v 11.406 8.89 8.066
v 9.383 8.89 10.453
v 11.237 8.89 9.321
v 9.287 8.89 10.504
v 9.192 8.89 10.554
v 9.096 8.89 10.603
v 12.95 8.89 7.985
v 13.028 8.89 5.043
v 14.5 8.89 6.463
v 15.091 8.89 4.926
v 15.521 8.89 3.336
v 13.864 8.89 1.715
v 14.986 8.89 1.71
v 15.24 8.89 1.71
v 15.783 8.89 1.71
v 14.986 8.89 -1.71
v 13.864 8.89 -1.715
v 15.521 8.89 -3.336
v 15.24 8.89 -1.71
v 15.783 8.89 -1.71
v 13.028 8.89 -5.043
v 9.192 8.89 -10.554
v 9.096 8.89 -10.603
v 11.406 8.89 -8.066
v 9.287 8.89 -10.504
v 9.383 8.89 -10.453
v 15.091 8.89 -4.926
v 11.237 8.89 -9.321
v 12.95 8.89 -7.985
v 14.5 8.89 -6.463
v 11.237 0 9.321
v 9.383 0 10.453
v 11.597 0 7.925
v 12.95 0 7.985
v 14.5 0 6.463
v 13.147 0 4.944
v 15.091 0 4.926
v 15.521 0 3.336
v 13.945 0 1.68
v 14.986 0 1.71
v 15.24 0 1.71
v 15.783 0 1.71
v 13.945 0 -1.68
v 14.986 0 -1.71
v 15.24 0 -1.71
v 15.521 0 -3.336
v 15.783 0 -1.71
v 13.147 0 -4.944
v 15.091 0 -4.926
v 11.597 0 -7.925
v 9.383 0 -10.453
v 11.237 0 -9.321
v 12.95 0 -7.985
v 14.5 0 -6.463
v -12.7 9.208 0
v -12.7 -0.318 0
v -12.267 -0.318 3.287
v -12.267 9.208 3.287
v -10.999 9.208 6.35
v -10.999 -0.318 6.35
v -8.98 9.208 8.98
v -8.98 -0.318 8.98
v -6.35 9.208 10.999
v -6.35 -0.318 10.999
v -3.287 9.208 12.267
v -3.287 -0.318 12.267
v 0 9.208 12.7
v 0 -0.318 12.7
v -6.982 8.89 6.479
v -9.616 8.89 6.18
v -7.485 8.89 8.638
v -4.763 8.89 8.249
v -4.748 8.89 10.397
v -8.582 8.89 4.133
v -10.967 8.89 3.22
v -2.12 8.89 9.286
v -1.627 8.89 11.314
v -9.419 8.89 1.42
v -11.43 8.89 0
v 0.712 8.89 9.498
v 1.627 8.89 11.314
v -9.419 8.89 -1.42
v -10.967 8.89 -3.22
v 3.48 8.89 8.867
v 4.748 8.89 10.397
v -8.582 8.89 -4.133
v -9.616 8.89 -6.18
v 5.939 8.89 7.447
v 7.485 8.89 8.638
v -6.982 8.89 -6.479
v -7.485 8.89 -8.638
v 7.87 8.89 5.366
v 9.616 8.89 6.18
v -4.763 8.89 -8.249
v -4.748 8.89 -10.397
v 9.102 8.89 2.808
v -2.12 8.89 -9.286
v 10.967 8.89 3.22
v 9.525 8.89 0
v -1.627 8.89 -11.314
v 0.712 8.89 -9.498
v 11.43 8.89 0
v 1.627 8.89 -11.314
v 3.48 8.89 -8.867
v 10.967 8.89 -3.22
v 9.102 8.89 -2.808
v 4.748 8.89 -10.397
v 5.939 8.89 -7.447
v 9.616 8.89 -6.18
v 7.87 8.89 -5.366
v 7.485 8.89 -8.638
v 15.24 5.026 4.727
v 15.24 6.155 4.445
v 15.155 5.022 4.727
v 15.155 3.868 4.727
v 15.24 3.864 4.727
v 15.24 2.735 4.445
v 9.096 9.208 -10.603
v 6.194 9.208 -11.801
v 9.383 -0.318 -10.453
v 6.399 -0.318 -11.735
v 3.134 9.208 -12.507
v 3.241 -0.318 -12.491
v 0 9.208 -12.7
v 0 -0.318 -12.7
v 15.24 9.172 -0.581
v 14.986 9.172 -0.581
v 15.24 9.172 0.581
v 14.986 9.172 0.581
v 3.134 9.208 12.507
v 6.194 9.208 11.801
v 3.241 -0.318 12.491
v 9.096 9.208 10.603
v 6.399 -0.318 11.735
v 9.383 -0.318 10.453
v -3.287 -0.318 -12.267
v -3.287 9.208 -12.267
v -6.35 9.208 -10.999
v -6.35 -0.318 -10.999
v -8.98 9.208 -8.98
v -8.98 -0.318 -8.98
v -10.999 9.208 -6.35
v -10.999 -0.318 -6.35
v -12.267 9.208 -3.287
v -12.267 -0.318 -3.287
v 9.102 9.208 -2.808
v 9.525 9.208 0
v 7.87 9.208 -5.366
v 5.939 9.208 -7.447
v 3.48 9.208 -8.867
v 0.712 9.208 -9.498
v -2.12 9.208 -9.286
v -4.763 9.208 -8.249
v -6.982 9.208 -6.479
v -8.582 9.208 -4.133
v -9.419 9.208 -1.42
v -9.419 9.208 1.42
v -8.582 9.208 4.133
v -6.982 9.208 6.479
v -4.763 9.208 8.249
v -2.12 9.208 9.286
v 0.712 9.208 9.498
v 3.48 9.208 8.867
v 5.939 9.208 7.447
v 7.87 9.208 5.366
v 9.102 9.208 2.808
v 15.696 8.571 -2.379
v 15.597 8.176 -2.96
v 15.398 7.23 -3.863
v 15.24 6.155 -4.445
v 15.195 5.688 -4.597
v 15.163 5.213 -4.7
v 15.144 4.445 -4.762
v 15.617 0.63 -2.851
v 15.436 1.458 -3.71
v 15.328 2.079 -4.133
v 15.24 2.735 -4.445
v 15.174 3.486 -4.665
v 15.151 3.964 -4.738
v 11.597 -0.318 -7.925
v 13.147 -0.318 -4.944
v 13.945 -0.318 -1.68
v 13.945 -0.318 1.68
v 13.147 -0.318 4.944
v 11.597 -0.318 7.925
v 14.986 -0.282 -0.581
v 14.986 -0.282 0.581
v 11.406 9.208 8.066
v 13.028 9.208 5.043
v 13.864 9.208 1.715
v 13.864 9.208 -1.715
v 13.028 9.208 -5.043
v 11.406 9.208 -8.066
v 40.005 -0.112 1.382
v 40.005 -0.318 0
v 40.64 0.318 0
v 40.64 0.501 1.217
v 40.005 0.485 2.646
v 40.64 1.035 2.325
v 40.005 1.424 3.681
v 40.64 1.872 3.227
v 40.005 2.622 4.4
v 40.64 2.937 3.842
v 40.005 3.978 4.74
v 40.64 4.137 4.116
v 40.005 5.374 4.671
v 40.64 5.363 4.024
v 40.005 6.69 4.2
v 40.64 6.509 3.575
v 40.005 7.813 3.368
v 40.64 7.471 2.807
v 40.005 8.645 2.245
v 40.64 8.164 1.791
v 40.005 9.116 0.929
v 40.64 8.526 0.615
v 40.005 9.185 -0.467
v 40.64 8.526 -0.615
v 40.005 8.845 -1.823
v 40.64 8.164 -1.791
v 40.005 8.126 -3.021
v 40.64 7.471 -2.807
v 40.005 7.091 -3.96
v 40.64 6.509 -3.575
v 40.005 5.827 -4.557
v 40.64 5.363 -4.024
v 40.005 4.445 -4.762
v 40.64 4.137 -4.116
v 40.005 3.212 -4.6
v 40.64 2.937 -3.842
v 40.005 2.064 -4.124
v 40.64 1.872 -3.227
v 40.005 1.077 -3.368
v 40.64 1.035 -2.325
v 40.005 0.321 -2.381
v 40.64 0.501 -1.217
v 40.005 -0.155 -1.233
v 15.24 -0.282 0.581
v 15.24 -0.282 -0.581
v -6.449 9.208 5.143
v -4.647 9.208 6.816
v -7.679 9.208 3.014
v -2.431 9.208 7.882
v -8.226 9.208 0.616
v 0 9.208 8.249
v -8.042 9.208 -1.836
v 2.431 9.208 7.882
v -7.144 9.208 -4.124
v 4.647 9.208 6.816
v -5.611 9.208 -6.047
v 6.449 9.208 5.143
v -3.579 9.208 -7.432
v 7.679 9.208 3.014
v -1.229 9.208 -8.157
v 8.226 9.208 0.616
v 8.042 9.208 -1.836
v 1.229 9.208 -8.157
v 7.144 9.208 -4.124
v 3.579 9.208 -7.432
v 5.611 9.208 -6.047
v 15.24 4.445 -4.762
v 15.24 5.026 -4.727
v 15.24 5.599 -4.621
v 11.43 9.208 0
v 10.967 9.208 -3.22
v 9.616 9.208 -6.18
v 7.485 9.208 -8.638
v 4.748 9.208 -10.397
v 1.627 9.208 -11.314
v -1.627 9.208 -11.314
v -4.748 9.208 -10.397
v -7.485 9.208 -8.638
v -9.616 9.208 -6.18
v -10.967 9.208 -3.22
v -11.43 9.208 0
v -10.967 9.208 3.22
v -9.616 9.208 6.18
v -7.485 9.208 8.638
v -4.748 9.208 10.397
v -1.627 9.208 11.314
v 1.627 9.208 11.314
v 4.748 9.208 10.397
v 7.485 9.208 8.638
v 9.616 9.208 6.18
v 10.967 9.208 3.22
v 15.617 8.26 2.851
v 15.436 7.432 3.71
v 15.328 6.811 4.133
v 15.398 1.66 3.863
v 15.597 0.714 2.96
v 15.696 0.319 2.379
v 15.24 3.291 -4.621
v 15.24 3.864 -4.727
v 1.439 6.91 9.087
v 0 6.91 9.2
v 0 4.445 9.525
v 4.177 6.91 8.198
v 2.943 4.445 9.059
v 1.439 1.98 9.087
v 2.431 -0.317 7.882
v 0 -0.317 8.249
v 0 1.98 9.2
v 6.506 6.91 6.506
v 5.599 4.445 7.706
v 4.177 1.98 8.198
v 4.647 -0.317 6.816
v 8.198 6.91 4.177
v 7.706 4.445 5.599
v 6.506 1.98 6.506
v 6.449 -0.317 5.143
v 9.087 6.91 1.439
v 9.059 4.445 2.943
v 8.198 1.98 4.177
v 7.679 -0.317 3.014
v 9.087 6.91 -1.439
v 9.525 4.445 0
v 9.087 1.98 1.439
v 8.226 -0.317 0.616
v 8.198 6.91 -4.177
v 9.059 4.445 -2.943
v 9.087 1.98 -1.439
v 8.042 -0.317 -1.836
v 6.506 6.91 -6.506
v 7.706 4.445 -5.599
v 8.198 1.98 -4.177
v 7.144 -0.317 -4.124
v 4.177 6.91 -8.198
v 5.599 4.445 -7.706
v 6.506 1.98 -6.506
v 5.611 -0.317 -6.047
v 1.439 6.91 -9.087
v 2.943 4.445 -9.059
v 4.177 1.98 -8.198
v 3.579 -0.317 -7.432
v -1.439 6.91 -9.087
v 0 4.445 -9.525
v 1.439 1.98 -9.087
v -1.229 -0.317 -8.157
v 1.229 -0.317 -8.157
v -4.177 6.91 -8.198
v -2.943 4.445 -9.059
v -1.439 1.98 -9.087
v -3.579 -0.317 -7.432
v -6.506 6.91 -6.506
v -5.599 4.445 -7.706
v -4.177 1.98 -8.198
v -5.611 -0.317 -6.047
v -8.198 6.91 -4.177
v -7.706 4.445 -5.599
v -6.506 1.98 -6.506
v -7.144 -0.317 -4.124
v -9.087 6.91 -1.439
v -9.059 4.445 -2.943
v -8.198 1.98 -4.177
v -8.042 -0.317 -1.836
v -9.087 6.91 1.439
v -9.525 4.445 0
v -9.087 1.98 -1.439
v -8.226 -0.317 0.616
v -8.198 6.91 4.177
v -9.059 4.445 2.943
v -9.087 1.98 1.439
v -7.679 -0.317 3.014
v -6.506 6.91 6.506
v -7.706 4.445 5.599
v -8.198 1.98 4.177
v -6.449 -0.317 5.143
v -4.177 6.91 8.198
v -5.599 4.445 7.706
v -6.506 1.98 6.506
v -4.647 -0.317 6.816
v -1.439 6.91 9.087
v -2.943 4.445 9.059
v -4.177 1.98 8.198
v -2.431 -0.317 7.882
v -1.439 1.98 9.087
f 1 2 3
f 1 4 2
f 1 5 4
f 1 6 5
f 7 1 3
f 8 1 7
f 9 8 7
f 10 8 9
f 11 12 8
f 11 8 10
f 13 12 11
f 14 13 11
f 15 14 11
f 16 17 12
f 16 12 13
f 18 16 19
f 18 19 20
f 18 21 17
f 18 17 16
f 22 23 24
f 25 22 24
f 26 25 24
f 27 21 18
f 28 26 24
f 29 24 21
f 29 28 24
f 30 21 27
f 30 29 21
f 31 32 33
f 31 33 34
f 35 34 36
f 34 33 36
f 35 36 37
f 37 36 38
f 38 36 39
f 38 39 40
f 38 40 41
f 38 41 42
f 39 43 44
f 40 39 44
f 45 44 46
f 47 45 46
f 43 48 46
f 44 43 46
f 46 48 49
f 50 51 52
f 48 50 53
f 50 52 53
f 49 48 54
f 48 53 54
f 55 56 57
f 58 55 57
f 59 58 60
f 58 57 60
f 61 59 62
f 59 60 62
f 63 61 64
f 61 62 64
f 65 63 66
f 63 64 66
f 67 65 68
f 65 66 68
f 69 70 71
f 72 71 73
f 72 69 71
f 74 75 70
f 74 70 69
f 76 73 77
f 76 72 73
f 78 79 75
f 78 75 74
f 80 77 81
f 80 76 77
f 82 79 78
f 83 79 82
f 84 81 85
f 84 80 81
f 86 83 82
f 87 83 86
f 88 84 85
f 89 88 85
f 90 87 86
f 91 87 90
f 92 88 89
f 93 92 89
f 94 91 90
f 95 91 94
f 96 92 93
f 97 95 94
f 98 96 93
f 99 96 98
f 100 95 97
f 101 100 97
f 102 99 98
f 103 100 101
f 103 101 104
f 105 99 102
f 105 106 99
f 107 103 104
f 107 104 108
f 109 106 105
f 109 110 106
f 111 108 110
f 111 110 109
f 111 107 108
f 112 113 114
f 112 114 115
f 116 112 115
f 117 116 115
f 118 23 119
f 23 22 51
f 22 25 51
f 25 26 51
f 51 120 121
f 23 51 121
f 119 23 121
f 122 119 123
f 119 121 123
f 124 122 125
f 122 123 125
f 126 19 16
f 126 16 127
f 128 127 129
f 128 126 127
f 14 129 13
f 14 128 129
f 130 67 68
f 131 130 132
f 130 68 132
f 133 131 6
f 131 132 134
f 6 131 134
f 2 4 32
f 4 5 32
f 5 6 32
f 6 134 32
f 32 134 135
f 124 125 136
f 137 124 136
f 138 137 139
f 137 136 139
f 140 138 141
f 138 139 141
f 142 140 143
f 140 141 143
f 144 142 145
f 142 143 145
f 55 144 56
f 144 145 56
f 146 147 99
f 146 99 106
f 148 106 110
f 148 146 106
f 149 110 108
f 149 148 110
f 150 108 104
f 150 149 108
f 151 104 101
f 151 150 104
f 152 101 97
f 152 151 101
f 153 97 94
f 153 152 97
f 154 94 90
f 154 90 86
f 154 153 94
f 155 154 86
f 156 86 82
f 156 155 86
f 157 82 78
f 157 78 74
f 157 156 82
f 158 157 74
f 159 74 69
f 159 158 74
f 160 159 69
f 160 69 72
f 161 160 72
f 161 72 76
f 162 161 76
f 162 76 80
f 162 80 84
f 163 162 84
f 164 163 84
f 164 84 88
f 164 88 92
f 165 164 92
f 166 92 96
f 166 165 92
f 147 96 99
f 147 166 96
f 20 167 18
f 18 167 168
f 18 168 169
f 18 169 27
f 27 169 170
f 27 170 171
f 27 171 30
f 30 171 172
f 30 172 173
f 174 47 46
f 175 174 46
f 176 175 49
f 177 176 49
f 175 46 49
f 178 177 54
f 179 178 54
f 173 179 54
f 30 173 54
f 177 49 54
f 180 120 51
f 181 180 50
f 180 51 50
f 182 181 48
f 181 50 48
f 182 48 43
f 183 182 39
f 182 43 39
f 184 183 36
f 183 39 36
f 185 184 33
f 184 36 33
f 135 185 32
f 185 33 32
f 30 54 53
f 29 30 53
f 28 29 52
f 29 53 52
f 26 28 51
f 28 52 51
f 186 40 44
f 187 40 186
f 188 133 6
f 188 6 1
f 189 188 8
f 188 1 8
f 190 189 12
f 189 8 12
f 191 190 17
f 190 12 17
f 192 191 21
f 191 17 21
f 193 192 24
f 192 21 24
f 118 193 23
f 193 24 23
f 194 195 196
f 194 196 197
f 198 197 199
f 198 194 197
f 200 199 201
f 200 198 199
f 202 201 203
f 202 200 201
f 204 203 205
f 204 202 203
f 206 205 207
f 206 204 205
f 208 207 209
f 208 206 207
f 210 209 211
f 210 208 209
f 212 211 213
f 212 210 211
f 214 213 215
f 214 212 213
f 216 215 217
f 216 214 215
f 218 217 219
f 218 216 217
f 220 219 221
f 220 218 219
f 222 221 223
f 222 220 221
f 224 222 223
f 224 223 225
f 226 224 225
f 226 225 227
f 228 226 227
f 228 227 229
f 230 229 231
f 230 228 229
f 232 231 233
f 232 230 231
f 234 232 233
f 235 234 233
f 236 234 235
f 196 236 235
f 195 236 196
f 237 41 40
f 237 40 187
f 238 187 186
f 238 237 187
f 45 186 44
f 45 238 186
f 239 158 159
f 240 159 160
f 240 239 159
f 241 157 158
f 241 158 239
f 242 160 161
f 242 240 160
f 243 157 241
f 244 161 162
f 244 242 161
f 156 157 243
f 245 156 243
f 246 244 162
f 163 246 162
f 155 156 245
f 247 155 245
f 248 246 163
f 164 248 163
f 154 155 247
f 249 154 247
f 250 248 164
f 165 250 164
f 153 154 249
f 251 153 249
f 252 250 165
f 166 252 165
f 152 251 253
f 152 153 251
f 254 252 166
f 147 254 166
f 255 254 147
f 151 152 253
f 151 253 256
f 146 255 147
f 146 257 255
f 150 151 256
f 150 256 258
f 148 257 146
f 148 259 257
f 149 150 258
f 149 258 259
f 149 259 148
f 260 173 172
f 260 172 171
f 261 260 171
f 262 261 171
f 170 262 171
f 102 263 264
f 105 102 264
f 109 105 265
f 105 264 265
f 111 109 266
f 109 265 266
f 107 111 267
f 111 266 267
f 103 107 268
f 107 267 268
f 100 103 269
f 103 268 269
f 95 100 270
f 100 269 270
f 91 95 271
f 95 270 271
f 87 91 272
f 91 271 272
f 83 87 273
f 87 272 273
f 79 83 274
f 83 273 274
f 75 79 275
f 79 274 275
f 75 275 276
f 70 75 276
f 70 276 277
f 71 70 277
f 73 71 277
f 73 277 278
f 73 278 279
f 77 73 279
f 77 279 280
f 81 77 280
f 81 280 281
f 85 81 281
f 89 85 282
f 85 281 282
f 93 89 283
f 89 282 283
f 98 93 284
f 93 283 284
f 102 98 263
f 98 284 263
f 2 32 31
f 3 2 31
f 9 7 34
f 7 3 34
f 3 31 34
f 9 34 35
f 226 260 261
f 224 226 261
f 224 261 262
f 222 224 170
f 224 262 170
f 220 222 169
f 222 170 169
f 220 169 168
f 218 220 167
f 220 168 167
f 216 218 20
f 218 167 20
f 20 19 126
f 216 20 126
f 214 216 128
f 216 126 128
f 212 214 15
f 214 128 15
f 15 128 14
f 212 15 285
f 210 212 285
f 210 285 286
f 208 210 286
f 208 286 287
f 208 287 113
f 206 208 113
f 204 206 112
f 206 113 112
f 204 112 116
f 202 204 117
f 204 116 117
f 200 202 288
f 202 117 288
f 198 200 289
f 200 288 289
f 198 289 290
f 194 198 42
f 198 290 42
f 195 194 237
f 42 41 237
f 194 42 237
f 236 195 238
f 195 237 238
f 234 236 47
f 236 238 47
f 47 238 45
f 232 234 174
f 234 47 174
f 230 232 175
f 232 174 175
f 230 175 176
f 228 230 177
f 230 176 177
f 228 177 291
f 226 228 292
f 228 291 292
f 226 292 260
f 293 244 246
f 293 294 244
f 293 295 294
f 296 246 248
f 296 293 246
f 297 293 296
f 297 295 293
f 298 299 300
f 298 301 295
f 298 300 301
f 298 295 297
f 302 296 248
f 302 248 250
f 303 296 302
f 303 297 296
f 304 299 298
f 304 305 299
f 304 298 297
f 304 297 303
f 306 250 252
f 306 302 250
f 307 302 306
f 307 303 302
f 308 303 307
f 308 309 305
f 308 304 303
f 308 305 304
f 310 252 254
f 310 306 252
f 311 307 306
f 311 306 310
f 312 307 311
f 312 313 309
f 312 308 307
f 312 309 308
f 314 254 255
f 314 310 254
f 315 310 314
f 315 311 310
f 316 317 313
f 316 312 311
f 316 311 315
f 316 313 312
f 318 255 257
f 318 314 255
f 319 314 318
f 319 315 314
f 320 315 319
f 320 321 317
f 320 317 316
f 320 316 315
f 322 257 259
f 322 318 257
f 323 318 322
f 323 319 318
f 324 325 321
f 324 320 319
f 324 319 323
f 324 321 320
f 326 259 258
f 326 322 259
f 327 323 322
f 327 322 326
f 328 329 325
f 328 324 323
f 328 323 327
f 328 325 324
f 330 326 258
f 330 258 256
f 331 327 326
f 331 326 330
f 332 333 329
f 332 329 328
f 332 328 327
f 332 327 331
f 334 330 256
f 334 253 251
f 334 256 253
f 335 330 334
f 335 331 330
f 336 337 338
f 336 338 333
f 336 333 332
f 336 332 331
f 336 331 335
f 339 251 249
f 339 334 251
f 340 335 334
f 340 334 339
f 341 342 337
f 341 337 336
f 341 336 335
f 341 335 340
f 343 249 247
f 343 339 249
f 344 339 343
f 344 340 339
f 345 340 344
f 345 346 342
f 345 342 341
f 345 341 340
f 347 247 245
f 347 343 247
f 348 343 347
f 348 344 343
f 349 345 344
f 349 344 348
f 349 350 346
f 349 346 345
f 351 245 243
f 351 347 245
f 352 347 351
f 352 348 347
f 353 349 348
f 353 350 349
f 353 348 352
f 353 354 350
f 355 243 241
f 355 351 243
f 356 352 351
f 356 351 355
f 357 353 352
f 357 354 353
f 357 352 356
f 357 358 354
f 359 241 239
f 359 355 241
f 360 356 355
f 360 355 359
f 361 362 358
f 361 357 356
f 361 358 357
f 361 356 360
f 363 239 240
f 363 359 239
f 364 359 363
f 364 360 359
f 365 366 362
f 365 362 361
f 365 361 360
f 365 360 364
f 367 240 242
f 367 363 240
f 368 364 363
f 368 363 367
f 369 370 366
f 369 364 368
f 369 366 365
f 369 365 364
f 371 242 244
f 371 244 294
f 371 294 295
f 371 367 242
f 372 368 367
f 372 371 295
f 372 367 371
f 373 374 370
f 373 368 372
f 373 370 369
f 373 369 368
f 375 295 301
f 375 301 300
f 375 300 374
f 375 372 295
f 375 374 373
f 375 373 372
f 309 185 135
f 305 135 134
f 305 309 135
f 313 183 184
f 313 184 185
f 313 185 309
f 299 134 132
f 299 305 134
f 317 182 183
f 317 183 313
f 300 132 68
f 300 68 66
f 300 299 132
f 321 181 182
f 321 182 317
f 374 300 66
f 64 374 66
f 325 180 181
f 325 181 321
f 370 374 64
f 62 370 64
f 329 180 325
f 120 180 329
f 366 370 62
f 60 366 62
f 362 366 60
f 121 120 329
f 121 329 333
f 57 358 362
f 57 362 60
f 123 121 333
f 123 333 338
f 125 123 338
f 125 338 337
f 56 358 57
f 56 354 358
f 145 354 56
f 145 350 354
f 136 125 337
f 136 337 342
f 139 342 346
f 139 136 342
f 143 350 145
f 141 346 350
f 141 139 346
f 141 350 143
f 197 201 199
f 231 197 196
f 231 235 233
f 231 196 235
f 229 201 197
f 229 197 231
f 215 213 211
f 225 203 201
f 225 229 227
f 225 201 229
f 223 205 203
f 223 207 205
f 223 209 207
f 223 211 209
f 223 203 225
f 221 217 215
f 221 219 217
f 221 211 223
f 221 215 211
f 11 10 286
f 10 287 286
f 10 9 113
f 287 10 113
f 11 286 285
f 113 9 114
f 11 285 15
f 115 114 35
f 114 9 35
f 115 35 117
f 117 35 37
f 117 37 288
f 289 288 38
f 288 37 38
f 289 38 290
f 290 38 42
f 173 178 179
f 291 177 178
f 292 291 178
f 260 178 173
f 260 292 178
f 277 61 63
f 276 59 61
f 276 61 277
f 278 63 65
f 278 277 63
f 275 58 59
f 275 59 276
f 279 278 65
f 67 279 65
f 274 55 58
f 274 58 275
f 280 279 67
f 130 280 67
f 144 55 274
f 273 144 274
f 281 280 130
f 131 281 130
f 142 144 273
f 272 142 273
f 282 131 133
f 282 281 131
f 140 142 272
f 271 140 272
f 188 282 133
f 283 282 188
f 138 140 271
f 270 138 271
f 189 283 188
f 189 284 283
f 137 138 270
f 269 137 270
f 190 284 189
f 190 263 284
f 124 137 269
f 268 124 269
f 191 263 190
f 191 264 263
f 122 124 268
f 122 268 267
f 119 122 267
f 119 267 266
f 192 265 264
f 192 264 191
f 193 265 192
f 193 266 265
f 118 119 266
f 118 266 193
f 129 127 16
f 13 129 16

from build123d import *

# Parameters (mm, degrees)
SKETCH2_R                = 15.875
BOSS_EXTRUDE1_DEPTH      = 8.89
SKETCH3_R                = 13.97
BOSS_EXTRUDE2_DEPTH      = 0.3175
SKETCH4_R                = 14.0462
BOSS_EXTRUDE3_DEPTH      = 0.3175
CUT_EXTRUDE2_DEPTH       = 10.525
SKETCH7_R                = 11.43
SKETCH7_R_2              = 9.525
CUT_EXTRUDE3_DEPTH       = 0.3175
SKETCH9_R                = 4.7625
BOSS_EXTRUDE4_DEPTH      = 25.4
BOSS_EXTRUDE4_DEPTH_BACK = 0.254


with BuildPart() as part:
    # Sketch2 → Boss-Extrude1 (new body)
    with BuildSketch(Plane(origin=(0, 0, 0), x_dir=(1, 0, 0), z_dir=(0, 1, 0))):
        Circle(SKETCH2_R)
    extrude(amount=BOSS_EXTRUDE1_DEPTH)

    # Sketch3 → Boss-Extrude2 (add)
    with BuildSketch(Plane(origin=(0, 8.89, 0), x_dir=(1, 0, 0), z_dir=(0, 1, 0))):
        Circle(SKETCH3_R)
    extrude(amount=BOSS_EXTRUDE2_DEPTH)

    # Sketch4 → Boss-Extrude3 (add)
    with BuildSketch(Plane(origin=(0, 0, 0), x_dir=(-1, 0, 0), z_dir=(0, -1, 0))):
        Circle(SKETCH4_R)
    extrude(amount=BOSS_EXTRUDE3_DEPTH)

    # Sketch5 → Cut-Extrude2 (cut, through all)
    with BuildSketch(Plane(origin=(0, -0.3175, 0), x_dir=(-1, 0, 0), z_dir=(0, -1, 0))):
        with BuildLine():
            ThreePointArc((15.875, 0), (3.303921778, 15.527386319), (-14.499768616, 6.463152102))
            ThreePointArc((-14.499768616, 6.463152102), (-12.112281343, 8.677516697), (-9.382547241, 10.452920248))
            ThreePointArc((-9.382547241, 10.452920248), (5.723049859, 12.827409511), (14.0462, 0))
            ThreePointArc((14.0462, 0), (5.723049859, -12.827409511), (-9.382547241, -10.452920248))
            ThreePointArc((-9.382547241, -10.452920248), (-12.112281343, -8.677516697), (-14.499768616, -6.463152102))
            ThreePointArc((-14.499768616, -6.463152102), (3.303921778, -15.527386319), (15.875, 0))
        make_face()
        with BuildLine():
            ThreePointArc((14.0462, 0), (5.723049859, 12.827409511), (-9.382547241, 10.452920248))
            ThreePointArc((-9.382547241, 10.452920248), (-4.835884527, 12.180274323), (0, 12.7))
            ThreePointArc((0, 12.7), (8.980256121, 8.980256121), (12.7, 0))
            ThreePointArc((12.7, 0), (8.980256121, -8.980256121), (0, -12.7))
            ThreePointArc((0, -12.7), (-4.835884527, -12.180274323), (-9.382547241, -10.452920248))
            ThreePointArc((-9.382547241, -10.452920248), (5.723049859, -12.827409511), (14.0462, 0))
        make_face()
    extrude(amount=-CUT_EXTRUDE2_DEPTH, mode=Mode.SUBTRACT)

    # Sketch6 → Cut-Revolve1 (revolve, cut)
    with BuildSketch(Plane(origin=(0, 0, 0), x_dir=(0, 0, -1), z_dir=(1, 0, 0))):
        with BuildLine():
            Line((0, -5.08), (0, 0))
            Line((0, 0), (0, 4.445))
            Line((0, 4.445), (0, 13.97))
            ThreePointArc((0, 13.97), (-9.525, 4.445), (0, -5.08))
        make_face()
    revolve(axis=Axis((0, -5.08, 0), (0, 1, 0)), mode=Mode.SUBTRACT)

    # Sketch7 → Cut-Extrude3 (cut)
    with BuildSketch(Plane(origin=(0, 9.2075, 0), x_dir=(1, 0, 0), z_dir=(0, 1, 0))):
        Circle(SKETCH7_R)
        Circle(SKETCH7_R_2, mode=Mode.SUBTRACT)
    extrude(amount=-CUT_EXTRUDE3_DEPTH, mode=Mode.SUBTRACT)

    # Sketch9 → Boss-Extrude4 (add, two sides)
    with BuildSketch(Plane(origin=(15.24, 0, 0), x_dir=(0, 0, -1), z_dir=(1, 0, 0))) as boss_extrude4_sk:
        with Locations((0, 4.445)):
            Circle(SKETCH9_R)
    extrude(amount=BOSS_EXTRUDE4_DEPTH)
    extrude(boss_extrude4_sk.sketch, amount=-BOSS_EXTRUDE4_DEPTH_BACK)

    # Sketch11 → Cut-Revolve2 (revolve, cut)
    with BuildSketch(Plane.XY):
        Polygon((40.64, -0.3175), (40.64, 0.3175), (40.005, -0.3175), align=None)
    revolve(axis=Axis((40.64, 4.445, 0), (-1, 0, 0)), mode=Mode.SUBTRACT)


solid = part.part
